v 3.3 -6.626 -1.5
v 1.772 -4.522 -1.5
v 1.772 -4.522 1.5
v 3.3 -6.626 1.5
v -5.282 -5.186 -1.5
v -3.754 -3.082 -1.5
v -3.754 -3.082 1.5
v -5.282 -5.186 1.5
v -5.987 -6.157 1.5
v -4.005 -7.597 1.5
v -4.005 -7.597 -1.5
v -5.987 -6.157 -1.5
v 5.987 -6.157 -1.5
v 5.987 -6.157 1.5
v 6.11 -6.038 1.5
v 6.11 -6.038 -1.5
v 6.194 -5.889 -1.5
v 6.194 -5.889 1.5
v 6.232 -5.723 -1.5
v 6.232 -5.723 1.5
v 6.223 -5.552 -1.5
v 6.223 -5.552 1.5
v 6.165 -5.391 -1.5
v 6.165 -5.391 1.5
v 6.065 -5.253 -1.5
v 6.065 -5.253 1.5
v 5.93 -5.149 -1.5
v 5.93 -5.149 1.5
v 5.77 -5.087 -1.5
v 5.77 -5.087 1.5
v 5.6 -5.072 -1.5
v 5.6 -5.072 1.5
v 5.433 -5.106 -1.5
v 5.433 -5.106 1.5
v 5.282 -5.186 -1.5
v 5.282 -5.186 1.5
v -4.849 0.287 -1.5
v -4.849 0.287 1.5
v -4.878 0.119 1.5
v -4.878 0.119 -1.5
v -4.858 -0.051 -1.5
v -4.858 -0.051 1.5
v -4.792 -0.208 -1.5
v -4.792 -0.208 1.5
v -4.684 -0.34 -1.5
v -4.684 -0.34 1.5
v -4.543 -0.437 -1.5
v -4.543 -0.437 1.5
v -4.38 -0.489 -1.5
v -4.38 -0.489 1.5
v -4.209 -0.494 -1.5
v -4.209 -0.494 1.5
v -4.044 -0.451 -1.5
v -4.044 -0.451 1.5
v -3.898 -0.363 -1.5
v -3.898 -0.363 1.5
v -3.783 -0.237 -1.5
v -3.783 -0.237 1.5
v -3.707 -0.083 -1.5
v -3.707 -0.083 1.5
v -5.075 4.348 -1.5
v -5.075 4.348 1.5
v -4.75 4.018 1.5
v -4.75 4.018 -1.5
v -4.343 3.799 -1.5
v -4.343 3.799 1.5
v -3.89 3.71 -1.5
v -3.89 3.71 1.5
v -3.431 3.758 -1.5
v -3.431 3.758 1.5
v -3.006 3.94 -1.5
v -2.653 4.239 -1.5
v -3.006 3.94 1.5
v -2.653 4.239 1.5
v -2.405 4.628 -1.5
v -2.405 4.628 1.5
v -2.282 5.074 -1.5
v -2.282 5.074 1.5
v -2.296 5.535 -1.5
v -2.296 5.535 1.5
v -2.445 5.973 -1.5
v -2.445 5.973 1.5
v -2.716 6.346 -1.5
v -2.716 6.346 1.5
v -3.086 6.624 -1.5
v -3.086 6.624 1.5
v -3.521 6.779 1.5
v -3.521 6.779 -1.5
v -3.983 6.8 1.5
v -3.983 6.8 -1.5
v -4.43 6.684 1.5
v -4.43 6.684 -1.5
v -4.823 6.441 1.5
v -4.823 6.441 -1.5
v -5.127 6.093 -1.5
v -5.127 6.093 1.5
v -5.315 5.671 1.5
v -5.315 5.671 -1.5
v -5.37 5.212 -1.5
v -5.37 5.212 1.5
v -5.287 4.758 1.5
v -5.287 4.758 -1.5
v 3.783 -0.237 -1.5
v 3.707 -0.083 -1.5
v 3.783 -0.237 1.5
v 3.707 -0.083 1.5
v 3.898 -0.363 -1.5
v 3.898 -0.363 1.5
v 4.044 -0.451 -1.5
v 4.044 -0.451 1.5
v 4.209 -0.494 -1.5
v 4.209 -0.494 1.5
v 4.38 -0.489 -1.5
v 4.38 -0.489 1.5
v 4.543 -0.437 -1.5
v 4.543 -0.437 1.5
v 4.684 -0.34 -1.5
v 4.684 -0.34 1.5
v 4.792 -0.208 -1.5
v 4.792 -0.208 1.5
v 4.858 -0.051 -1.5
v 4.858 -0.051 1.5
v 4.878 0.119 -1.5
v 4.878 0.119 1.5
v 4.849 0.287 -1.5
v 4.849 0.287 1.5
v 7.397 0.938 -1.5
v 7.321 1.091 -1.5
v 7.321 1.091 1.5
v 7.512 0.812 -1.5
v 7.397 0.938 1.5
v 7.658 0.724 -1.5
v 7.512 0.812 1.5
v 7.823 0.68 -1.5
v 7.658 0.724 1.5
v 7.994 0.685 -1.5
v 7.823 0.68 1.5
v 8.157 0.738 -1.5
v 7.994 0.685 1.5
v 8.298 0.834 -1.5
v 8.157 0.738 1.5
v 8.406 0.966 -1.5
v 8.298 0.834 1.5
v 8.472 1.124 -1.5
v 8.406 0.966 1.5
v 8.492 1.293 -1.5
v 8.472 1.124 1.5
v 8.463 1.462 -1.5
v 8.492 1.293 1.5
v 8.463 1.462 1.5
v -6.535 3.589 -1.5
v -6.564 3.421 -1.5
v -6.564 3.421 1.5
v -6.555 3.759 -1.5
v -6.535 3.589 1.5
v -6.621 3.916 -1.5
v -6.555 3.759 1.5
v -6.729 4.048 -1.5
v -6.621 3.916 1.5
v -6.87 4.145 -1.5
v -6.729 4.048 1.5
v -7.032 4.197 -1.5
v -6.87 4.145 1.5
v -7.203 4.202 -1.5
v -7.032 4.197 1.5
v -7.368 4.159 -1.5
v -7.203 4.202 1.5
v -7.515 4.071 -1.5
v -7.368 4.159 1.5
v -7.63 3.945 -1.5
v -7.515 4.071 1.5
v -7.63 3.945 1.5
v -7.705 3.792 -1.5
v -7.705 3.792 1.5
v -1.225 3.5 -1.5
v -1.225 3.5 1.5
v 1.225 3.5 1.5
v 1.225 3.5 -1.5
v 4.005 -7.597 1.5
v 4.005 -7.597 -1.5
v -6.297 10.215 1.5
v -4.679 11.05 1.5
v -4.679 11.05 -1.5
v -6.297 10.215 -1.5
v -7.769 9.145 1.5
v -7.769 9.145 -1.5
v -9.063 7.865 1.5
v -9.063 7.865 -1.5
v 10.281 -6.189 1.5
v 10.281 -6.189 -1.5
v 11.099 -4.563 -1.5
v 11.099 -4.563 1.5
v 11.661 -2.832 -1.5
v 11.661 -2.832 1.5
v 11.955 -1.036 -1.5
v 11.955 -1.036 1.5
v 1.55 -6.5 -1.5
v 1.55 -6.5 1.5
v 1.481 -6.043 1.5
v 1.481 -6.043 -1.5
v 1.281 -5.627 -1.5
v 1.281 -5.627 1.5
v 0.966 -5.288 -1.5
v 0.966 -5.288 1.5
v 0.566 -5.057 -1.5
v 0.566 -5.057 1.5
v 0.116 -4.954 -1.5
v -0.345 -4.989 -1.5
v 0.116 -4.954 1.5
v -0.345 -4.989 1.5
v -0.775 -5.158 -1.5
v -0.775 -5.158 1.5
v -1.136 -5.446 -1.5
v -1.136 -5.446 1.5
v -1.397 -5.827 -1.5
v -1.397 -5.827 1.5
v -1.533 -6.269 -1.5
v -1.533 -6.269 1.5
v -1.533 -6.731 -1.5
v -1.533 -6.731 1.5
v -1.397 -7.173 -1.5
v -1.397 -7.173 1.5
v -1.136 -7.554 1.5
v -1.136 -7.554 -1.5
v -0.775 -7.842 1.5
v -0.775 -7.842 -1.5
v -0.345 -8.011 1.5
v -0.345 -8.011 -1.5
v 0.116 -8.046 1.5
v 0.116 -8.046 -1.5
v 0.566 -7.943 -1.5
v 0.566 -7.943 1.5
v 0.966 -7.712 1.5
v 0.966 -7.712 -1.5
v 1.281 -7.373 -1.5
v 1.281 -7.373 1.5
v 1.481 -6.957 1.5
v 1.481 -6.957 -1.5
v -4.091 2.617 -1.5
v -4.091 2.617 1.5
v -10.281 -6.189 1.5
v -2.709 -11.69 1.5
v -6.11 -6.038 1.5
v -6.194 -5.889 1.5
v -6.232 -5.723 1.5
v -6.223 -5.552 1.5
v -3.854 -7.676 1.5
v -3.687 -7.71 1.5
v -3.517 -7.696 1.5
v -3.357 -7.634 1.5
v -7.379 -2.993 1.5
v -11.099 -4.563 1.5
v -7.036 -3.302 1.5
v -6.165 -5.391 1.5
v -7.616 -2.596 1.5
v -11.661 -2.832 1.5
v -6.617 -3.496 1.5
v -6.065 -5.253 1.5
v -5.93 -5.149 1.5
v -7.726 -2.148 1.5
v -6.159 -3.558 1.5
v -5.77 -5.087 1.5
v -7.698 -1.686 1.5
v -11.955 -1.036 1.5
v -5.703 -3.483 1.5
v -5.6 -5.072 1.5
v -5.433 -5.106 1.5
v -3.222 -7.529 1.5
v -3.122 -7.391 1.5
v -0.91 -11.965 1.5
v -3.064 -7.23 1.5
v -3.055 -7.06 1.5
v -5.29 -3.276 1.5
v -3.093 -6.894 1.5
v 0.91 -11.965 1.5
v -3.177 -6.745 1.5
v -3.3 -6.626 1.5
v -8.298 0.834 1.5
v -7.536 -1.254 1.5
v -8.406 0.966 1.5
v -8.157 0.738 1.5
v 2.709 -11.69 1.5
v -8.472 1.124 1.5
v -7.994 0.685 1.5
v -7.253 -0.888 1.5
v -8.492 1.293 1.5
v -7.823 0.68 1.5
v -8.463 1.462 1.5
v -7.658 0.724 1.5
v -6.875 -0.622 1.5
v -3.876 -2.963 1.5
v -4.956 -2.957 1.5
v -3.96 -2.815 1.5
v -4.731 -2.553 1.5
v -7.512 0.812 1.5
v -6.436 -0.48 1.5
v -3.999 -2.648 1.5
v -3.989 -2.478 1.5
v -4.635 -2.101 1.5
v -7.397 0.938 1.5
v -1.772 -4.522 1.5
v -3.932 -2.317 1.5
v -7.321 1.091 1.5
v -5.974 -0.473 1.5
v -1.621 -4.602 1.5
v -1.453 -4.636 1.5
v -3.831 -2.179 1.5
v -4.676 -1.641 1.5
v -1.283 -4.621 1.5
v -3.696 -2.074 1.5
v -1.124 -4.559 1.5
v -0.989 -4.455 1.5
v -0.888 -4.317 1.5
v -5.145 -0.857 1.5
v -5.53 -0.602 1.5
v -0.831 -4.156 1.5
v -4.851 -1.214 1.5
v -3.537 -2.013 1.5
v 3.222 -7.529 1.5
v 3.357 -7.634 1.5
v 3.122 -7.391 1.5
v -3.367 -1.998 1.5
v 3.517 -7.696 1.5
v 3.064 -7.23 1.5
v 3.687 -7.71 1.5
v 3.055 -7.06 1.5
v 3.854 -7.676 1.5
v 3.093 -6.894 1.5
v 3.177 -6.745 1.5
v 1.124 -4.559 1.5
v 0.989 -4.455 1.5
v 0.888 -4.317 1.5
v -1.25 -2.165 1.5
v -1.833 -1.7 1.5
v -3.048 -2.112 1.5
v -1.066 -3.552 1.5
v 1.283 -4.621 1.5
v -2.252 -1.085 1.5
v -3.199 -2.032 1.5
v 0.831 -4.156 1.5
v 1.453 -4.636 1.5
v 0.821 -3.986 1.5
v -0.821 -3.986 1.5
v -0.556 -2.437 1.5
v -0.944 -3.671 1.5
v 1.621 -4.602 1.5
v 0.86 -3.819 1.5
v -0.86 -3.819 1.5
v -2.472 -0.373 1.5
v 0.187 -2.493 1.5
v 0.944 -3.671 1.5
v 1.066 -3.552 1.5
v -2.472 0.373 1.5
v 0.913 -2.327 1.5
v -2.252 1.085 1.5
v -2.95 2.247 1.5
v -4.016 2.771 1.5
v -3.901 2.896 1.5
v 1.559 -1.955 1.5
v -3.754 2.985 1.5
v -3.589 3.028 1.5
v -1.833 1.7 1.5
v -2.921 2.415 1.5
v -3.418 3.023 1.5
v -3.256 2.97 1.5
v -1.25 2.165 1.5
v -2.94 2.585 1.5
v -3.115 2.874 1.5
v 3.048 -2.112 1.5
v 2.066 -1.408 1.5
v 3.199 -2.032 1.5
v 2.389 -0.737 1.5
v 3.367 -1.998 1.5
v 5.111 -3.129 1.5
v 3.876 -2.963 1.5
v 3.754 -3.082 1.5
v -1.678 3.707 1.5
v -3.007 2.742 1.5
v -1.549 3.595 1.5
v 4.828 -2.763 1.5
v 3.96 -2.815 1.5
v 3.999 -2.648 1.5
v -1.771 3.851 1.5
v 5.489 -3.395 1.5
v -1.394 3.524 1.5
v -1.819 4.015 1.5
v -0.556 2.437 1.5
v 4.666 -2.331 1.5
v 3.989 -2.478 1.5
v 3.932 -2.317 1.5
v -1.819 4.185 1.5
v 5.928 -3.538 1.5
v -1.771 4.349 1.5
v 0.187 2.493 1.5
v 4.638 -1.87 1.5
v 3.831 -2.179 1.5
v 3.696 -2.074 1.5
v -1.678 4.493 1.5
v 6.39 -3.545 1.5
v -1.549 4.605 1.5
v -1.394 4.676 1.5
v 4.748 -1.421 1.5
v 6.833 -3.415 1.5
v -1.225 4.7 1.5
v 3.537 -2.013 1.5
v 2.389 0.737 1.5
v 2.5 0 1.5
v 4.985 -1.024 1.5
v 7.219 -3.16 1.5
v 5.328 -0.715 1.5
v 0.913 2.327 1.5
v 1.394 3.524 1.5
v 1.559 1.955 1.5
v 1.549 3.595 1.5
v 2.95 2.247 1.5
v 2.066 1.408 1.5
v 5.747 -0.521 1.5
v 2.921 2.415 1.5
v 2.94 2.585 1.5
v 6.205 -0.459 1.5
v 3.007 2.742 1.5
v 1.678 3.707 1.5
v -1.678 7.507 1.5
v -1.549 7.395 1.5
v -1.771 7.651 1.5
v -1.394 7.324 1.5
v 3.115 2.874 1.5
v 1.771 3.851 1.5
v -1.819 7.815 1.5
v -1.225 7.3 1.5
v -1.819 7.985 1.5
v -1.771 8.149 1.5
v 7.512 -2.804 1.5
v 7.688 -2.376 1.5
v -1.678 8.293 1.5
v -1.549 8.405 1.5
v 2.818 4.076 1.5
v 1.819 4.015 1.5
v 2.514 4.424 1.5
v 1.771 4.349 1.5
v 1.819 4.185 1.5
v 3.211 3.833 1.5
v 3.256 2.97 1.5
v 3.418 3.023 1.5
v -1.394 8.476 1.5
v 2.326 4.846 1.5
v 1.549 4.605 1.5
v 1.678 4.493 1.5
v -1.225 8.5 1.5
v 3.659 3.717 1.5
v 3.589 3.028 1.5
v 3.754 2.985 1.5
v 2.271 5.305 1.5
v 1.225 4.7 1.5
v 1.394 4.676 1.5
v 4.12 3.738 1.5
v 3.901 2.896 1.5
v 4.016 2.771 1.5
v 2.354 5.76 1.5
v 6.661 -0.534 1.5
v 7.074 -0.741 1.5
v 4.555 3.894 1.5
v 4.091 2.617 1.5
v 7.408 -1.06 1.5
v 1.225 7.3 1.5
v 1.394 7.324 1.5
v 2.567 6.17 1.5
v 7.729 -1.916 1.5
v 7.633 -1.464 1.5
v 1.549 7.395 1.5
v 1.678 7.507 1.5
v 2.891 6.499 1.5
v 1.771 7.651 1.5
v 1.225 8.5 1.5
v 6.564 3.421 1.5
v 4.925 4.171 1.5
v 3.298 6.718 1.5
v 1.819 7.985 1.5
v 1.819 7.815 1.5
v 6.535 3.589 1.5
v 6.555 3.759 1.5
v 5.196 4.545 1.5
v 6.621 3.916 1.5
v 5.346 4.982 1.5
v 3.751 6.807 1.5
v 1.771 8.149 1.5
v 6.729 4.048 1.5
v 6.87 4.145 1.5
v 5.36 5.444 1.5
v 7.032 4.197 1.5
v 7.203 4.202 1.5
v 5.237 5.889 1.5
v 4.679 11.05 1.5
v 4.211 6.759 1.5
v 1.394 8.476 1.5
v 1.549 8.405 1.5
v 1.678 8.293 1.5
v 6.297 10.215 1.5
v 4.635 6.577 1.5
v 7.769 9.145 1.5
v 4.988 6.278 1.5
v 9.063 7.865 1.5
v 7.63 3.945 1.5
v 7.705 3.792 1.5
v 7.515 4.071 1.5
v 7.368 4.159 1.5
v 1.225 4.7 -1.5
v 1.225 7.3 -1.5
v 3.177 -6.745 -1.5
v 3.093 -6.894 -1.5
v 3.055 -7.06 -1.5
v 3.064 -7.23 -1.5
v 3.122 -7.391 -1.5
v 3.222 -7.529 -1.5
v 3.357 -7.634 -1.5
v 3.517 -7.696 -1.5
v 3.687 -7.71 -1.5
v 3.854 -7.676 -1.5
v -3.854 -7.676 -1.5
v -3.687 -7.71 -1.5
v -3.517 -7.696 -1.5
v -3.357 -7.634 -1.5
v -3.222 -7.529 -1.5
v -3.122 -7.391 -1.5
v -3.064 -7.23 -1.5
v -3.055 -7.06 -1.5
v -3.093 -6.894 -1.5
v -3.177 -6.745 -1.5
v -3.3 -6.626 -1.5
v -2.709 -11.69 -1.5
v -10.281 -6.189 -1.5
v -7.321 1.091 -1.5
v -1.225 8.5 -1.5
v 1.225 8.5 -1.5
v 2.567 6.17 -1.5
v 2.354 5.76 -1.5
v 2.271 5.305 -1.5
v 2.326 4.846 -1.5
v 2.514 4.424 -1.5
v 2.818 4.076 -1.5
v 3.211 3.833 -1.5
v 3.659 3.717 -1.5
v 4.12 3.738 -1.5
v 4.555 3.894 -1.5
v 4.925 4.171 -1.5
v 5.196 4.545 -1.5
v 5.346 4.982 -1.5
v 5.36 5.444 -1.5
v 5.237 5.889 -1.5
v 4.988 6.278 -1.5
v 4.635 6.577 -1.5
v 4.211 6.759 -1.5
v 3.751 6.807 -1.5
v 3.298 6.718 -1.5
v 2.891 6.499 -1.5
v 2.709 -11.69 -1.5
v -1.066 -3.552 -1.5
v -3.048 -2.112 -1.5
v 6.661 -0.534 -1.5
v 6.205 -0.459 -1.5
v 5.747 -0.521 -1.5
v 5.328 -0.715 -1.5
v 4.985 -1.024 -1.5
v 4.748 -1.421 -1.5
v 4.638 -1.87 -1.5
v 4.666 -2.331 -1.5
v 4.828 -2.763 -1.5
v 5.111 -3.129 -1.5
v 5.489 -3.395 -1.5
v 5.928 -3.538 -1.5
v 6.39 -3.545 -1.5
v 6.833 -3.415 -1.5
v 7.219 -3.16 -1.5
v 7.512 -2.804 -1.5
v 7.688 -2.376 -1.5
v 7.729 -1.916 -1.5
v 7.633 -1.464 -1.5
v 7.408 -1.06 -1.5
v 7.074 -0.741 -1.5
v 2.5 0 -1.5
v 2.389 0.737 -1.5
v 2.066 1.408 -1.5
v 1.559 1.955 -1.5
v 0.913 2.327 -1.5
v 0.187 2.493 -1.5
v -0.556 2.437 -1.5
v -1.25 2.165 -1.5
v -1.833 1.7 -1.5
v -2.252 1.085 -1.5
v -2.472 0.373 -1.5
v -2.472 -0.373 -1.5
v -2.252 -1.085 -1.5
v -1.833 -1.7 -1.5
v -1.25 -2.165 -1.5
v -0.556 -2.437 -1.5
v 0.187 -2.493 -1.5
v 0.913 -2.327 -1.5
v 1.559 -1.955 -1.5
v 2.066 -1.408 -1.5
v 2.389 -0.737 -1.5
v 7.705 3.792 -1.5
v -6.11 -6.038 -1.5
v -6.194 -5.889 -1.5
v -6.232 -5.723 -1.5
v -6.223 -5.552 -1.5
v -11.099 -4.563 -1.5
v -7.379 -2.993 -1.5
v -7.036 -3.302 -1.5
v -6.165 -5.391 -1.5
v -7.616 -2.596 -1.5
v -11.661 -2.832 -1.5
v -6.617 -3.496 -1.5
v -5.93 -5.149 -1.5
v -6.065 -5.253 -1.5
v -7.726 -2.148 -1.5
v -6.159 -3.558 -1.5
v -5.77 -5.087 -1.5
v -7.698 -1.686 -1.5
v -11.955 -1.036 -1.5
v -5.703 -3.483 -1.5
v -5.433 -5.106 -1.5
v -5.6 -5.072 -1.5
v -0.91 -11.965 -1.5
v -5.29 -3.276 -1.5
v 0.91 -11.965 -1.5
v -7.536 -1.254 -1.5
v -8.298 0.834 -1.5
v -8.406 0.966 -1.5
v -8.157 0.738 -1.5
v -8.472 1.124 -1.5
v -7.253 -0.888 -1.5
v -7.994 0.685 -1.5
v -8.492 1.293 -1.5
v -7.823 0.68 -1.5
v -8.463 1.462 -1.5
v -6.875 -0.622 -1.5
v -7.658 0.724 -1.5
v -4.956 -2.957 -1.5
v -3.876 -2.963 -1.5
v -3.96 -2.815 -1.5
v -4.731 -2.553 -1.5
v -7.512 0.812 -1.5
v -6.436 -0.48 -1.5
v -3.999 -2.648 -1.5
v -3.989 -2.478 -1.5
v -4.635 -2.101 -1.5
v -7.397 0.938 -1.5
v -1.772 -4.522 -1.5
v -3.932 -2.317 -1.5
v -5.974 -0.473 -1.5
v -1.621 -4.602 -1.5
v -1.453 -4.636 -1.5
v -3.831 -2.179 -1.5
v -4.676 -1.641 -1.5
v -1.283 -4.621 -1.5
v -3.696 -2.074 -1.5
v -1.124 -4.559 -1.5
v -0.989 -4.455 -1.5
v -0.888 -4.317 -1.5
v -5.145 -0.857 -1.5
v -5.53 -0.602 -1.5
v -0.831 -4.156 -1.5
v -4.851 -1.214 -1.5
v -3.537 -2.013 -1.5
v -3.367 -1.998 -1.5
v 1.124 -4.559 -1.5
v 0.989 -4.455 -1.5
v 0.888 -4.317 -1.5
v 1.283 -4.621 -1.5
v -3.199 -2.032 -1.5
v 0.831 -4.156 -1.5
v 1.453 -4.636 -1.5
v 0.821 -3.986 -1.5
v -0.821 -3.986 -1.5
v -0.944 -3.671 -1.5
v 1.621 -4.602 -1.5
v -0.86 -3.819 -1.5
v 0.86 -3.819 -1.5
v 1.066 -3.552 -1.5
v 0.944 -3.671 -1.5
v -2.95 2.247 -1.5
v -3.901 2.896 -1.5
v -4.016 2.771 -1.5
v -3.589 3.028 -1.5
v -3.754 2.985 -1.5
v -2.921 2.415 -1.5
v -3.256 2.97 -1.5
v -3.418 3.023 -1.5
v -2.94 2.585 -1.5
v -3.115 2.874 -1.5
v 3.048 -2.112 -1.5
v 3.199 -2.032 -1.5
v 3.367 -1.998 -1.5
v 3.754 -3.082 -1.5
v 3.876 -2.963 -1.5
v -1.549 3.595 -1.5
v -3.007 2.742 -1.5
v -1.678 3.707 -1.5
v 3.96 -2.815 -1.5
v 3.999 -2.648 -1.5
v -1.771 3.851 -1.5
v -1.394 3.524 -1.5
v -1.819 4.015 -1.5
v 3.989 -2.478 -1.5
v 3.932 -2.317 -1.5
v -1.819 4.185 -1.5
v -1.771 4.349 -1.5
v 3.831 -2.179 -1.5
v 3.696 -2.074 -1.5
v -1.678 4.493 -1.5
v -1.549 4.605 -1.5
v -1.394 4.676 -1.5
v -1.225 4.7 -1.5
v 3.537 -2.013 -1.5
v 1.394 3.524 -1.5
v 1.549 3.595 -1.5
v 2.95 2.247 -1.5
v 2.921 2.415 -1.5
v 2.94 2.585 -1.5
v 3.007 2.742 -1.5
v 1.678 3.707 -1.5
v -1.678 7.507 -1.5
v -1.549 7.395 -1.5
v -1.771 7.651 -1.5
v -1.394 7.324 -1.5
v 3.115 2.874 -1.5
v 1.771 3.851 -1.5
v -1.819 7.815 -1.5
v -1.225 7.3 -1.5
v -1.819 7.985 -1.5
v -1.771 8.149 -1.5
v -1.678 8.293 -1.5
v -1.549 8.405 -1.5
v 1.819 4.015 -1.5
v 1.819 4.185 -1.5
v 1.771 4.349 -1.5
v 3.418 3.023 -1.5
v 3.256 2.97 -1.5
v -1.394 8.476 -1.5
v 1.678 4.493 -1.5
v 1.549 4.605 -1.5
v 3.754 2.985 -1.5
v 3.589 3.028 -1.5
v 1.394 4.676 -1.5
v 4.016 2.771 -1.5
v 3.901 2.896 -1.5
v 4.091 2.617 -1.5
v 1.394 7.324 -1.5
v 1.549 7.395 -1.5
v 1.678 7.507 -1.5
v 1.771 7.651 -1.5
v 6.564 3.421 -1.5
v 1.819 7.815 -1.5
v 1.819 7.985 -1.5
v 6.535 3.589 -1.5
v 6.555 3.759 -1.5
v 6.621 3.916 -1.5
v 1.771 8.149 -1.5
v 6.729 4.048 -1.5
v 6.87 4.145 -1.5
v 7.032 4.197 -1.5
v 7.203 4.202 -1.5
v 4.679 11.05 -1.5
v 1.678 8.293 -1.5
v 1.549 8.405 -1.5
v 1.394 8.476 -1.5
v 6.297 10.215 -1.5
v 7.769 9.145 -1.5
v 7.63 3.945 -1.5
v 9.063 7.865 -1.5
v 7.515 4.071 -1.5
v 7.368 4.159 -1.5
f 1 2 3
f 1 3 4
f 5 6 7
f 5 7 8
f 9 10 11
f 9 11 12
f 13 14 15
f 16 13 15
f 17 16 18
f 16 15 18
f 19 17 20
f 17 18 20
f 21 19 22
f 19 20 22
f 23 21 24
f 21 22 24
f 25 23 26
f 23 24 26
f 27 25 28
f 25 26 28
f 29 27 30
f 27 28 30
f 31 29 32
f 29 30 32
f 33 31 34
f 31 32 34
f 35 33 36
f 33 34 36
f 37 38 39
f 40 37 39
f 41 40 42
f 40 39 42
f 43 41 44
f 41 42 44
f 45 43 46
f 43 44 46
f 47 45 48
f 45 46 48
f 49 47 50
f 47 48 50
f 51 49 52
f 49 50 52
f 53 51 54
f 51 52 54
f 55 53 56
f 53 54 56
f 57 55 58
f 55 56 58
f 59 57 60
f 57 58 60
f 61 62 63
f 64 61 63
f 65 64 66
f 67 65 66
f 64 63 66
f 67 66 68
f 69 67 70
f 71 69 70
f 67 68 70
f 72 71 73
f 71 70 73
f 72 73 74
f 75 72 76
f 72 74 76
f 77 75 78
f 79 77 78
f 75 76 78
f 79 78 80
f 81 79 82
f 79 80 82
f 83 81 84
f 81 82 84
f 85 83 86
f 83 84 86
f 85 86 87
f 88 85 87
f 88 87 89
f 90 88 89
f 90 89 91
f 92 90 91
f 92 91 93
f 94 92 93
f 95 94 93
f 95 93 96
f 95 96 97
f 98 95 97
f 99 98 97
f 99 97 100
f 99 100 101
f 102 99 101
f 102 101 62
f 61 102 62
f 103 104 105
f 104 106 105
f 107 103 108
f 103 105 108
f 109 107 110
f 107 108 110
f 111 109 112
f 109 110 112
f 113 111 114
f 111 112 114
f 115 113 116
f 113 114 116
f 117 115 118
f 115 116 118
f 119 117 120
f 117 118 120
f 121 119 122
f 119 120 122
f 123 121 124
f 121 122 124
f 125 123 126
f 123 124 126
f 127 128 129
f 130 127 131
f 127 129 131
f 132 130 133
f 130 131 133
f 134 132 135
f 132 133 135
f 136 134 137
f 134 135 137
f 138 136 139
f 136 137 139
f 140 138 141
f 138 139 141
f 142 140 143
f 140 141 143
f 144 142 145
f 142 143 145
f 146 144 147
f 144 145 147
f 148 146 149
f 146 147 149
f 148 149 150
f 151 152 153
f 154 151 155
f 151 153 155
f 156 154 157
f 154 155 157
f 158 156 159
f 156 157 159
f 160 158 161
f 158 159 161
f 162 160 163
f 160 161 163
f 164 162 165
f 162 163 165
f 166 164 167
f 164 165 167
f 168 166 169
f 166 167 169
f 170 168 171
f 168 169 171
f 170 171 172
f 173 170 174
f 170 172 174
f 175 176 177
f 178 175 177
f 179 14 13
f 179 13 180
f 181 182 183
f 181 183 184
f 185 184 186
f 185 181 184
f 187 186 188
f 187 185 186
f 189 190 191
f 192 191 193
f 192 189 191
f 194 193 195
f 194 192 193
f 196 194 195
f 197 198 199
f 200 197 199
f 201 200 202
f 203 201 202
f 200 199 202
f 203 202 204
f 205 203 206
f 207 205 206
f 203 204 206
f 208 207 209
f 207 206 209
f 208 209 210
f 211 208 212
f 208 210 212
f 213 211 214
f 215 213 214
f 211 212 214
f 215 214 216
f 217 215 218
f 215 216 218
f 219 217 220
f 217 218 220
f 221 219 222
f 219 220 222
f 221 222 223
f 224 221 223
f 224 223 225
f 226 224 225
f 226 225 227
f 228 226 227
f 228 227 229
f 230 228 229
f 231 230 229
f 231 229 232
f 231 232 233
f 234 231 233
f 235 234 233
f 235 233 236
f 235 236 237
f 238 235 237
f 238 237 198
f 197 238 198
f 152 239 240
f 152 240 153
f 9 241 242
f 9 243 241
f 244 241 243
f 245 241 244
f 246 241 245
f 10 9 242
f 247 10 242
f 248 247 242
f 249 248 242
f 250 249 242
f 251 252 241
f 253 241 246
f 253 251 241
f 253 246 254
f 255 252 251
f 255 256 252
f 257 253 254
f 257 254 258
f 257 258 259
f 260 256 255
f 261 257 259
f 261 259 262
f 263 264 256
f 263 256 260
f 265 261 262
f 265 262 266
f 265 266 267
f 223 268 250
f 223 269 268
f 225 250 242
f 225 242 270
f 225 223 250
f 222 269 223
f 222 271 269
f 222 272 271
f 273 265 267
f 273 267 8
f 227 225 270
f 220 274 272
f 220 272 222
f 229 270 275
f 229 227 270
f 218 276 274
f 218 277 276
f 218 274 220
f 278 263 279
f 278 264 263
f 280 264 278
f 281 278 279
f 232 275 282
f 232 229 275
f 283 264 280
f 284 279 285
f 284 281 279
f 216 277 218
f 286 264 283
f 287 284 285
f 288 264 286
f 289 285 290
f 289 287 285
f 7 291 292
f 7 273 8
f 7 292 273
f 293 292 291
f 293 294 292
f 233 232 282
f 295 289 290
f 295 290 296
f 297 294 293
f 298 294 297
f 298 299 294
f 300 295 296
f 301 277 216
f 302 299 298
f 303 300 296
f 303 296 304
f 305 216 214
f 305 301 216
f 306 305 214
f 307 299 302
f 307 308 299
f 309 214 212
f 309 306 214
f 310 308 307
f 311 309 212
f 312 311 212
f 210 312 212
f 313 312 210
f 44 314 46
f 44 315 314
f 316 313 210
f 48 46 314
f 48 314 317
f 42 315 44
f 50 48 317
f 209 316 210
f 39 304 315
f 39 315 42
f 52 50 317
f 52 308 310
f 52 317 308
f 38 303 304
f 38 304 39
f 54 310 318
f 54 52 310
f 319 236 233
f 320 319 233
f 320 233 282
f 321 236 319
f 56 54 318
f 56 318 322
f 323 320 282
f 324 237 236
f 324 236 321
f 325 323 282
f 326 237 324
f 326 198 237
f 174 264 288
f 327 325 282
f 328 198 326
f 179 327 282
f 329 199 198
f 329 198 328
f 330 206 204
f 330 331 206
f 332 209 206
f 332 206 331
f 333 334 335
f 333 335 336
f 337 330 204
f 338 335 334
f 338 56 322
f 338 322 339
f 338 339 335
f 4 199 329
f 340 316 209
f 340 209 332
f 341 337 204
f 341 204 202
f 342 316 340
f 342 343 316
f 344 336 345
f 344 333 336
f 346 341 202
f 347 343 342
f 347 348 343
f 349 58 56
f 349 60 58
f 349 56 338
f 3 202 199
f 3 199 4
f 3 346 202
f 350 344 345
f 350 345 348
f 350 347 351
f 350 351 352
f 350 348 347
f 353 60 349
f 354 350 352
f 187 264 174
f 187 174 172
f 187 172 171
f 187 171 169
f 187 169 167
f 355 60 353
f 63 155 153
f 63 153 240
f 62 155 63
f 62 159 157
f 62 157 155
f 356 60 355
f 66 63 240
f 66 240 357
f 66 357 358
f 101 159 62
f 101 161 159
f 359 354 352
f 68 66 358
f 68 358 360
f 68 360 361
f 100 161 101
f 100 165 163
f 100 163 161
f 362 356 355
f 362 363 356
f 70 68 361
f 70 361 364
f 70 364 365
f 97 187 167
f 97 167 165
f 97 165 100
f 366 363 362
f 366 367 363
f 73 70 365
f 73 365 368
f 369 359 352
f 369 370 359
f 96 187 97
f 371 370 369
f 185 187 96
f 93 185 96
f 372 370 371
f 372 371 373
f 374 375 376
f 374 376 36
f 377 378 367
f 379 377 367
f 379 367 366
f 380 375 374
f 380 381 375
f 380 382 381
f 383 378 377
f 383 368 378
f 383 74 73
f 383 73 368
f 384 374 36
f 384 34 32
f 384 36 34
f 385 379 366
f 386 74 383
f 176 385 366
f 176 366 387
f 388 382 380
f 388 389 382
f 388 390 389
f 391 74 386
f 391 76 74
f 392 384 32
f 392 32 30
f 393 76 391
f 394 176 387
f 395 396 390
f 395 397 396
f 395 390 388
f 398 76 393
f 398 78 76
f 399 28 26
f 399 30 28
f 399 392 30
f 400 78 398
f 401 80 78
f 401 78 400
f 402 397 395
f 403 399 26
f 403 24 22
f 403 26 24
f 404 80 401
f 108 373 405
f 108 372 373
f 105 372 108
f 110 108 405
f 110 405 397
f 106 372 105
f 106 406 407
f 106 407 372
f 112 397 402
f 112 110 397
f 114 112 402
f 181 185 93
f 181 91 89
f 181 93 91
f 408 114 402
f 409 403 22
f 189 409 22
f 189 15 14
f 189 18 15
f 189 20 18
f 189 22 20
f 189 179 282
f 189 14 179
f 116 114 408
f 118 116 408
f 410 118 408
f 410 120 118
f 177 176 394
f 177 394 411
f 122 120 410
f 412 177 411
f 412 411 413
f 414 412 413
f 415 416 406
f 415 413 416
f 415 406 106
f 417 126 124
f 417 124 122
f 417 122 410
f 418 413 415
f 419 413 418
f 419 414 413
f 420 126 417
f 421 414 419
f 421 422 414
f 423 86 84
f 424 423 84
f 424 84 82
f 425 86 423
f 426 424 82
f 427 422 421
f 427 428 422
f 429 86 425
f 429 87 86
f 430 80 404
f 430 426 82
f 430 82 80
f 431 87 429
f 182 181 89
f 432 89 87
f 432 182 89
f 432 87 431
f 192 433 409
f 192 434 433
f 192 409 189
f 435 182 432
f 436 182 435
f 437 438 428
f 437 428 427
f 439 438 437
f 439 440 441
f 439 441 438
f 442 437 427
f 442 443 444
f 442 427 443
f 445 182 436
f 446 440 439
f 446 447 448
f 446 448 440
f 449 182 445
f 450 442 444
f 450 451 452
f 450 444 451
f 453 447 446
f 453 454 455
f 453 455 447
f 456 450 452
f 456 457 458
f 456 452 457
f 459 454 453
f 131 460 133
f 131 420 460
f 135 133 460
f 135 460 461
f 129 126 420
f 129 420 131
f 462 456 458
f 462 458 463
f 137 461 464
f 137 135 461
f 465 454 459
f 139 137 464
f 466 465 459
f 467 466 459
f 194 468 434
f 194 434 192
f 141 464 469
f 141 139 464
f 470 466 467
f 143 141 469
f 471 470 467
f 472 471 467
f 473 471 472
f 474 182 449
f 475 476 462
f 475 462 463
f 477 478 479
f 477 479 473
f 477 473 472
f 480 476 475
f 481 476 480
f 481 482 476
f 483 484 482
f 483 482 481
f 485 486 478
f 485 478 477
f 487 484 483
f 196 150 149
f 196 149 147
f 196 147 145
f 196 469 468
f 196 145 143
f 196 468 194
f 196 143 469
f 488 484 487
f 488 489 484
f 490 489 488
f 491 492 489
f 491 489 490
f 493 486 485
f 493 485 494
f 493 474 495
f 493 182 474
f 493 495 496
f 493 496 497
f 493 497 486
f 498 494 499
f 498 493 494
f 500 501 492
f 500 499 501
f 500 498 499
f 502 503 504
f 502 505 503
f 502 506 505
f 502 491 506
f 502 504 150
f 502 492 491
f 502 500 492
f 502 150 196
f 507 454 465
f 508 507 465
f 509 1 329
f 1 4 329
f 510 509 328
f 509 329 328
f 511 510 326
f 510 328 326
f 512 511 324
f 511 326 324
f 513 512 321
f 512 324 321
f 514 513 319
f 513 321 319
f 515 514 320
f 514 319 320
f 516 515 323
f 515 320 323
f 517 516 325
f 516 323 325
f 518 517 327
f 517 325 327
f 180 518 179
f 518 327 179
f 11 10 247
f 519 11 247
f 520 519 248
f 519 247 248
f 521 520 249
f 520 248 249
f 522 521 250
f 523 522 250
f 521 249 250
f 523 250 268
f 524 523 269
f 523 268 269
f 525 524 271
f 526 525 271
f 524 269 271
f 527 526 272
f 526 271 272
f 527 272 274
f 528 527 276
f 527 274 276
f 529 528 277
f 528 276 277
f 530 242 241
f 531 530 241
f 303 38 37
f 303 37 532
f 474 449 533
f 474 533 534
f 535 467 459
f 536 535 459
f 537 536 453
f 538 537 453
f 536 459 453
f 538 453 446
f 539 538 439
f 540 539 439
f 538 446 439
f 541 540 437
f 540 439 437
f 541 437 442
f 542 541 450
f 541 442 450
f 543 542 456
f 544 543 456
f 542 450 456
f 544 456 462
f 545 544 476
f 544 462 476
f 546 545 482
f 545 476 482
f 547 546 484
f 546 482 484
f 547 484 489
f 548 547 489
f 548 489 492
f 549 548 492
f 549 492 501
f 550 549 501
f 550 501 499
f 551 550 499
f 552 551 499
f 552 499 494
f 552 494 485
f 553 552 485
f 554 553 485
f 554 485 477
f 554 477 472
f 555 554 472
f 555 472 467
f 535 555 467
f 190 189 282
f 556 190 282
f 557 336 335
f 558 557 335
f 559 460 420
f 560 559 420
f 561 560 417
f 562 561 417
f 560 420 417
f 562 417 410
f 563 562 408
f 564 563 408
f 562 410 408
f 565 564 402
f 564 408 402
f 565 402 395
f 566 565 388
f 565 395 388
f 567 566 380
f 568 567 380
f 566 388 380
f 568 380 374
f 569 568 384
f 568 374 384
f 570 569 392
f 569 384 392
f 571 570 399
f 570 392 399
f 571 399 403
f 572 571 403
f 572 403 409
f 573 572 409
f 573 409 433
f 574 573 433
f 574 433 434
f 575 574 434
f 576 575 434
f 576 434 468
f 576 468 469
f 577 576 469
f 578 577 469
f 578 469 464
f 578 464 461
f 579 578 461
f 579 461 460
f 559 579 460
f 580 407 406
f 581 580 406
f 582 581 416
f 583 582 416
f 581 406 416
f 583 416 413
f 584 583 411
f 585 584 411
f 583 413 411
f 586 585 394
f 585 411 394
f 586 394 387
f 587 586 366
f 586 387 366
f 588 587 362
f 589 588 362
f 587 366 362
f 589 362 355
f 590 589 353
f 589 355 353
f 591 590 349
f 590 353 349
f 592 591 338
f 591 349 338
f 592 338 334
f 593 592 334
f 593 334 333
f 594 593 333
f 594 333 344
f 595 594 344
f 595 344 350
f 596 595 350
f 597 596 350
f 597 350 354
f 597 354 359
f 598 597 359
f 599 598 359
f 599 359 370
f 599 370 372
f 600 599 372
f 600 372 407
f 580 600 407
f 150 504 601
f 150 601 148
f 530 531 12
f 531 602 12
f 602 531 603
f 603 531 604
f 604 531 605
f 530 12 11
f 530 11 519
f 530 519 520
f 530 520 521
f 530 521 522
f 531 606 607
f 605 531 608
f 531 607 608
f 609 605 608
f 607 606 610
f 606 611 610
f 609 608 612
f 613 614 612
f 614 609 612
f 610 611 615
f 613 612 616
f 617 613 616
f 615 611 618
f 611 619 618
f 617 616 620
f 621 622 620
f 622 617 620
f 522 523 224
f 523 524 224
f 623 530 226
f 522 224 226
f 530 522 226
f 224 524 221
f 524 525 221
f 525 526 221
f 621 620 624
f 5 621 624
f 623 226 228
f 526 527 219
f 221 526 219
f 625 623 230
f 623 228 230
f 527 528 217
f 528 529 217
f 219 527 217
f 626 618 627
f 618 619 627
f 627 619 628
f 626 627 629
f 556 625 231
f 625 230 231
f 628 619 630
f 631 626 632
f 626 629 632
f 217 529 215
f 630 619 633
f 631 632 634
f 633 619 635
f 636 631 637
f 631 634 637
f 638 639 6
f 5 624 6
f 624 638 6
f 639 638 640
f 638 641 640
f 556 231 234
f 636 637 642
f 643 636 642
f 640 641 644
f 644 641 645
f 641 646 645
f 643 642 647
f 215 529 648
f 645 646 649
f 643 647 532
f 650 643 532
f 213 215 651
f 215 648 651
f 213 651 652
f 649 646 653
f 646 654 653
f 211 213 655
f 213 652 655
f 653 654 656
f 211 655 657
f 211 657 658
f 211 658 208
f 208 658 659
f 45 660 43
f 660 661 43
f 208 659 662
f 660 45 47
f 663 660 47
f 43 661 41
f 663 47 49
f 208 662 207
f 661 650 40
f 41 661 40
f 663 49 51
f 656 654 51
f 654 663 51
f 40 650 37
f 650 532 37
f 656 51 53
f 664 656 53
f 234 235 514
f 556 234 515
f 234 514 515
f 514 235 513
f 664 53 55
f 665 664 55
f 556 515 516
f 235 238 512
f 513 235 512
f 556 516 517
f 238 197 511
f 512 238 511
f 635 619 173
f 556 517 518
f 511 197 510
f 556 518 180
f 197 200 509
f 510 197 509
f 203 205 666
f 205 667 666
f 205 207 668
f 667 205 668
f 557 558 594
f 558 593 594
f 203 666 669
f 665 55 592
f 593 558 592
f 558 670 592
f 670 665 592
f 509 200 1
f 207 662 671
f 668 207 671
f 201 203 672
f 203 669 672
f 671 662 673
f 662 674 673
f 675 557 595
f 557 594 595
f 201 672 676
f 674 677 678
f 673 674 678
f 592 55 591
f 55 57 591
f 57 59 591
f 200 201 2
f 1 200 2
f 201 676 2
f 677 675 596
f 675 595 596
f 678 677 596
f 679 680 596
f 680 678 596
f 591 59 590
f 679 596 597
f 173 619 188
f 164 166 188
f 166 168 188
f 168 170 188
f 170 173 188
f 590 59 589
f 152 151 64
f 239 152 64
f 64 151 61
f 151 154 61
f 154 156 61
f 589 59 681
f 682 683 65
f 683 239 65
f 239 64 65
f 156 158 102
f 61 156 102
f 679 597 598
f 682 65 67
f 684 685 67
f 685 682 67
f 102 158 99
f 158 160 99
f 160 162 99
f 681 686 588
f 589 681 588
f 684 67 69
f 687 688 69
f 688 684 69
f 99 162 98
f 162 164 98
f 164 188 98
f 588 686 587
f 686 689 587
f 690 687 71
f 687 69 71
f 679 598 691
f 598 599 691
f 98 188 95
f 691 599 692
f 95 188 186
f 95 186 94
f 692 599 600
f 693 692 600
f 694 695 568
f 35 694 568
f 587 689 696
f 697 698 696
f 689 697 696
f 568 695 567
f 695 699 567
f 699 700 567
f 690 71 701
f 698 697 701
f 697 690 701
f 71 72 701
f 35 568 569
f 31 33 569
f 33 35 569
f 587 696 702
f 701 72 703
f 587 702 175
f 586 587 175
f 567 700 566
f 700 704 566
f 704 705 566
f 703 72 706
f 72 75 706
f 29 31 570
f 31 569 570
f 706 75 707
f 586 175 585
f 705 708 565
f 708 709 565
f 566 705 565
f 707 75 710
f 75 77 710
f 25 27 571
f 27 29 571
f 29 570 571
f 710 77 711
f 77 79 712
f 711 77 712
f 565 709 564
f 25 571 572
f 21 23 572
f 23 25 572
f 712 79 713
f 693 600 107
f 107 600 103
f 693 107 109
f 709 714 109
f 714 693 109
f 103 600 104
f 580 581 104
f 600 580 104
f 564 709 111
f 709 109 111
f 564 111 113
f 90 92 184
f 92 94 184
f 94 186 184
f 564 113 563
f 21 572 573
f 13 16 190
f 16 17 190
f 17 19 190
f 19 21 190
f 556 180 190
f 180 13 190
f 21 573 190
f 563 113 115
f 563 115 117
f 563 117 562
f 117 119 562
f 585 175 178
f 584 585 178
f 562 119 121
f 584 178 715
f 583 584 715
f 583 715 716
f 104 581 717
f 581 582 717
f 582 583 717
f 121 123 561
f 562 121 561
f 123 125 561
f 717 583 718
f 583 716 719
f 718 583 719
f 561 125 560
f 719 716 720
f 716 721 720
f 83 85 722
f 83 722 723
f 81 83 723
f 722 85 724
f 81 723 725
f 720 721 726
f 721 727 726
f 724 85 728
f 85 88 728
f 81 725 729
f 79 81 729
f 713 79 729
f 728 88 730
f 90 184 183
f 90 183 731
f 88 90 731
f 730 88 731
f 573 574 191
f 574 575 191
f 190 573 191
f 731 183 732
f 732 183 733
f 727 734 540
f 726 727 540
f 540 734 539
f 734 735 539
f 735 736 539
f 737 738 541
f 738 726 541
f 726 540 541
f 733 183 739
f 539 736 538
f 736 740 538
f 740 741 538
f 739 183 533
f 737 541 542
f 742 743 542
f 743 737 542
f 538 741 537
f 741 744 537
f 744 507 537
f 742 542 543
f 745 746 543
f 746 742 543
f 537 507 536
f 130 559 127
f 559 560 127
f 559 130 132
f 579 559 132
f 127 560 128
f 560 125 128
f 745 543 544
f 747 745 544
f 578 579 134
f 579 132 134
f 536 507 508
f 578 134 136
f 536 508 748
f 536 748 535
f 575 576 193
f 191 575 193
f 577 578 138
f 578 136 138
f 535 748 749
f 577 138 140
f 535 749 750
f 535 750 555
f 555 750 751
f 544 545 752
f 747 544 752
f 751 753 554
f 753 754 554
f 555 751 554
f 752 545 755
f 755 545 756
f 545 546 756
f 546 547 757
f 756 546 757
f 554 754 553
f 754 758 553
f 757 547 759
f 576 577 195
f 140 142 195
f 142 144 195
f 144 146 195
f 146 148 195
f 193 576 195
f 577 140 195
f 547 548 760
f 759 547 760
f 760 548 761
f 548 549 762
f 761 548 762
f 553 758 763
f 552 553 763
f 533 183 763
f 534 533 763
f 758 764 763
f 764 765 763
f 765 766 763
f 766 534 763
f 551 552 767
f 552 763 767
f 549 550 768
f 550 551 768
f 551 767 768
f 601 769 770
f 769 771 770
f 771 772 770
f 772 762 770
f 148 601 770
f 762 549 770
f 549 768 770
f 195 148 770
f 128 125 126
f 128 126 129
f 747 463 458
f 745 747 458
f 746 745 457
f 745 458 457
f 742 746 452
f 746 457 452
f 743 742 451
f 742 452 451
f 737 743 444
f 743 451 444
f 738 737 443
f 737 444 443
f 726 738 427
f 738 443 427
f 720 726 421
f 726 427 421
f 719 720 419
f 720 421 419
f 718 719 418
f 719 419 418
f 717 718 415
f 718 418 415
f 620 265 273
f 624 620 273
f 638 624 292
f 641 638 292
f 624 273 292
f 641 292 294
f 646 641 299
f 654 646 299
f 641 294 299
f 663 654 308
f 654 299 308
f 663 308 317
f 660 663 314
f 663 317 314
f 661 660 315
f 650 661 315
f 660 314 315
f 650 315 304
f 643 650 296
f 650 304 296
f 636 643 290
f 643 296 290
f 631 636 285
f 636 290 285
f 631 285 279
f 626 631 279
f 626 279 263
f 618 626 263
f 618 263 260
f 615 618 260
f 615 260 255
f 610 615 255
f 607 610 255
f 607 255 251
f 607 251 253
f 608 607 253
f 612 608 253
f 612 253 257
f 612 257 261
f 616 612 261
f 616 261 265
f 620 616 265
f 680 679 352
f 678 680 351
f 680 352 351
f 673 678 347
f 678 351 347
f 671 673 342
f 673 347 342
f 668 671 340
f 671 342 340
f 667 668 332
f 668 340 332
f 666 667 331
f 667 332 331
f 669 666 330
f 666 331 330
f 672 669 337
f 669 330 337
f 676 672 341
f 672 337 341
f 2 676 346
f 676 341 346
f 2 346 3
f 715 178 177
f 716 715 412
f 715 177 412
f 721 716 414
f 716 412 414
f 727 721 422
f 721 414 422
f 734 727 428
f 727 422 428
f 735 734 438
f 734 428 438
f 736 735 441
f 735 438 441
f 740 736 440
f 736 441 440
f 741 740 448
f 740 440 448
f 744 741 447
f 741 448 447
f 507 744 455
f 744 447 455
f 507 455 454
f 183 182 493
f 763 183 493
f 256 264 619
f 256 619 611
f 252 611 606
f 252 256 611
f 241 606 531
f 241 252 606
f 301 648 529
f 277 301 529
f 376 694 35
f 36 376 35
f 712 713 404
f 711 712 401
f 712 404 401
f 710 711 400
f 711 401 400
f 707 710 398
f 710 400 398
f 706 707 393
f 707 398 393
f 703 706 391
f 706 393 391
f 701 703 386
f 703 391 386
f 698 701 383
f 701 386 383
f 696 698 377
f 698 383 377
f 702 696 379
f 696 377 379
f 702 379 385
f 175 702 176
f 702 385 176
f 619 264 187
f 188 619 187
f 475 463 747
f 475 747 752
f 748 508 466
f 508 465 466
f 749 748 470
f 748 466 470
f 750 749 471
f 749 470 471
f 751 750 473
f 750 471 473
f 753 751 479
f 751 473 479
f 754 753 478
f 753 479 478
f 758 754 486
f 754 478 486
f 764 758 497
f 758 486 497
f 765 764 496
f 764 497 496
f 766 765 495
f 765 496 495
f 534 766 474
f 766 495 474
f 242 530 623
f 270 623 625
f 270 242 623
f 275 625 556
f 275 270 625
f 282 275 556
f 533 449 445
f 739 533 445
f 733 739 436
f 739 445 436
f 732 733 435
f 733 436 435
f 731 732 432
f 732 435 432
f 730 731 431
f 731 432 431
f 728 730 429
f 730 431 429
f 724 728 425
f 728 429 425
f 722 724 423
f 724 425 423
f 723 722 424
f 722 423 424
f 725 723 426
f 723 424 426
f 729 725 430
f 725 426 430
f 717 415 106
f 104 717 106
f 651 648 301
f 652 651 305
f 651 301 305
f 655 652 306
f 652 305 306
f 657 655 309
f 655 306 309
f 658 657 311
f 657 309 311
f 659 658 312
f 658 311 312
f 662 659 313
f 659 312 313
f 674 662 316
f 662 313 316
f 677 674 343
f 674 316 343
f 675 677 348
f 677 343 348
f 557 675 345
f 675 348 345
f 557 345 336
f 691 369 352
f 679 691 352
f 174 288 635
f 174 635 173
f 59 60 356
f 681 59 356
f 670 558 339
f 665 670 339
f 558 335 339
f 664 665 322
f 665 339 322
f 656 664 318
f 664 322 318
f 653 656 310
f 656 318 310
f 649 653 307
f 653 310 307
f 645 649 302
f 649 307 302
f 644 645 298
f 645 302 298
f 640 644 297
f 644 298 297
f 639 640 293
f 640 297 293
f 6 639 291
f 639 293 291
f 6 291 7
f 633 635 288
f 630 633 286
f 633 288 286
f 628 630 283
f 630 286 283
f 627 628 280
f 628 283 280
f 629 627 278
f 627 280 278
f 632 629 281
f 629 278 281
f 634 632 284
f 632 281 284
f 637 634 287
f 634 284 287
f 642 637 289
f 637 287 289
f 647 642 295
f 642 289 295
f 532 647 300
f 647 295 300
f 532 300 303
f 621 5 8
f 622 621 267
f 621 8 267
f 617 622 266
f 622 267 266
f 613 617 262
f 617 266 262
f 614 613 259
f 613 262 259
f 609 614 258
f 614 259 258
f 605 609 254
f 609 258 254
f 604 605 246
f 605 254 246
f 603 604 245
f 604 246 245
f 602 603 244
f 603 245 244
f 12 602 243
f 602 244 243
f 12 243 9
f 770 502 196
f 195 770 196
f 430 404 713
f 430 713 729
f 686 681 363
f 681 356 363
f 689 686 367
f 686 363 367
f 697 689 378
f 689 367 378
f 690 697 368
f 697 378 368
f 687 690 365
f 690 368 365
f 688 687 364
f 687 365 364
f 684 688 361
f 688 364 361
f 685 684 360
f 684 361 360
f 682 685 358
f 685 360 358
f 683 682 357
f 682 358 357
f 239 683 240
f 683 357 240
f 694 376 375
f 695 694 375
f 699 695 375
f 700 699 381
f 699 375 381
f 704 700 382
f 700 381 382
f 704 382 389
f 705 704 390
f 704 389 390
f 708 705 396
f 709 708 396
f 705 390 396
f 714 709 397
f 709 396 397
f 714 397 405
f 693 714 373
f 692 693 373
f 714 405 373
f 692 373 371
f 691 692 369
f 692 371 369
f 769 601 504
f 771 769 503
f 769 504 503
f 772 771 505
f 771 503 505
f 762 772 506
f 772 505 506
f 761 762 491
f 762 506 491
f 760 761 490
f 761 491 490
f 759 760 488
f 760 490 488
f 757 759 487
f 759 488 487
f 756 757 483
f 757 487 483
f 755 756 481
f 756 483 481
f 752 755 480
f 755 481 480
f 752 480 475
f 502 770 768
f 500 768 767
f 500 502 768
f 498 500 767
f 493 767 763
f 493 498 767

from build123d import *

# Parameters (mm, degrees)
SKETCH_1_R               = 12
EXTRUDE_1_DEPTH          = 1.5
SKETCH_2_R               = 1.55
SKETCH_2_W               = 2.45
SKETCH_2_H               = 5
CUT_EXTRUDE_1_DEPTH      = 4
PATTERN_CIRCULAR_1_COUNT = 5
SKETCH_3_R               = 0.6
CUT_EXTRUDE_2_DEPTH      = 4
PATTERN_CIRCULAR_2_COUNT = 5
SKETCH_4_R               = 2.5
CUT_EXTRUDE_3_DEPTH      = 4
CUT_EXTRUDE_4_DEPTH      = 4
PATTERN_CIRCULAR_3_COUNT = 5


with BuildPart() as part:
    # 草图1 → 凸台-拉伸1 (new body, symmetric)
    with BuildSketch(Plane.XY):
        Circle(SKETCH_1_R)
    extrude(amount=EXTRUDE_1_DEPTH, both=True)

    # 草图2 → 切除-拉伸1 (cut, through all)
    with BuildSketch(Plane.XY.offset(1.5)):
        with Locations((0, -6.5)):
            Circle(SKETCH_2_R)
        with Locations((0, 6)):
            Rectangle(SKETCH_2_W, SKETCH_2_H)
    cut_extrude_1 = extrude(amount=-CUT_EXTRUDE_1_DEPTH, mode=Mode.SUBTRACT)

    # 阵列(圆周)1: 切除-拉伸1 ×5 about axis
    pattern_circular_1_axis = Axis((0, 0, 0), (0, 0, 1))
    for i in range(1, PATTERN_CIRCULAR_1_COUNT):
        add(cut_extrude_1.rotate(pattern_circular_1_axis, i * 360 / PATTERN_CIRCULAR_1_COUNT), mode=Mode.SUBTRACT)

    # 草图3 → 切除-拉伸2 (cut, through all)
    with BuildSketch(Plane.XY.offset(1.5)):
        with Locations((1.225, 7.9)):
            Circle(SKETCH_3_R)
        with Locations((-1.225, 7.9)):
            Circle(SKETCH_3_R)
        with Locations((-1.225, 4.1)):
            Circle(SKETCH_3_R)
        with Locations((1.225, 4.1)):
            Circle(SKETCH_3_R)
    cut_extrude_2 = extrude(amount=-CUT_EXTRUDE_2_DEPTH, mode=Mode.SUBTRACT)

    # 阵列(圆周)2: 切除-拉伸2 ×5 about axis
    pattern_circular_2_axis = Axis((0, 0, 0), (0, 0, 1))
    for i in range(1, PATTERN_CIRCULAR_2_COUNT):
        add(cut_extrude_2.rotate(pattern_circular_2_axis, i * 360 / PATTERN_CIRCULAR_2_COUNT), mode=Mode.SUBTRACT)

    # 草图4 → 切除-拉伸3 (cut, through all)
    with BuildSketch(Plane.XY.offset(1.5)):
        Circle(SKETCH_4_R)
    extrude(amount=-CUT_EXTRUDE_3_DEPTH, mode=Mode.SUBTRACT)

    # 草图5 → 切除-拉伸4 (cut, through all)
    with BuildSketch(Plane.XY.offset(1.5)):
        with BuildLine():
            Line((-4.679476466, 11.05), (4.679476466, 11.05))
            ThreePointArc((4.679476466, 11.05), (0, 12), (-4.679476466, 11.05))
        make_face()
    cut_extrude_4 = extrude(amount=-CUT_EXTRUDE_4_DEPTH, mode=Mode.SUBTRACT)

    # 阵列(圆周)3: 切除-拉伸4 ×5 about axis
    pattern_circular_3_axis = Axis((0, 0, 0), (0, 0, 1))
    for i in range(1, PATTERN_CIRCULAR_3_COUNT):
        add(cut_extrude_4.rotate(pattern_circular_3_axis, i * 360 / PATTERN_CIRCULAR_3_COUNT), mode=Mode.SUBTRACT)


solid = part.part
